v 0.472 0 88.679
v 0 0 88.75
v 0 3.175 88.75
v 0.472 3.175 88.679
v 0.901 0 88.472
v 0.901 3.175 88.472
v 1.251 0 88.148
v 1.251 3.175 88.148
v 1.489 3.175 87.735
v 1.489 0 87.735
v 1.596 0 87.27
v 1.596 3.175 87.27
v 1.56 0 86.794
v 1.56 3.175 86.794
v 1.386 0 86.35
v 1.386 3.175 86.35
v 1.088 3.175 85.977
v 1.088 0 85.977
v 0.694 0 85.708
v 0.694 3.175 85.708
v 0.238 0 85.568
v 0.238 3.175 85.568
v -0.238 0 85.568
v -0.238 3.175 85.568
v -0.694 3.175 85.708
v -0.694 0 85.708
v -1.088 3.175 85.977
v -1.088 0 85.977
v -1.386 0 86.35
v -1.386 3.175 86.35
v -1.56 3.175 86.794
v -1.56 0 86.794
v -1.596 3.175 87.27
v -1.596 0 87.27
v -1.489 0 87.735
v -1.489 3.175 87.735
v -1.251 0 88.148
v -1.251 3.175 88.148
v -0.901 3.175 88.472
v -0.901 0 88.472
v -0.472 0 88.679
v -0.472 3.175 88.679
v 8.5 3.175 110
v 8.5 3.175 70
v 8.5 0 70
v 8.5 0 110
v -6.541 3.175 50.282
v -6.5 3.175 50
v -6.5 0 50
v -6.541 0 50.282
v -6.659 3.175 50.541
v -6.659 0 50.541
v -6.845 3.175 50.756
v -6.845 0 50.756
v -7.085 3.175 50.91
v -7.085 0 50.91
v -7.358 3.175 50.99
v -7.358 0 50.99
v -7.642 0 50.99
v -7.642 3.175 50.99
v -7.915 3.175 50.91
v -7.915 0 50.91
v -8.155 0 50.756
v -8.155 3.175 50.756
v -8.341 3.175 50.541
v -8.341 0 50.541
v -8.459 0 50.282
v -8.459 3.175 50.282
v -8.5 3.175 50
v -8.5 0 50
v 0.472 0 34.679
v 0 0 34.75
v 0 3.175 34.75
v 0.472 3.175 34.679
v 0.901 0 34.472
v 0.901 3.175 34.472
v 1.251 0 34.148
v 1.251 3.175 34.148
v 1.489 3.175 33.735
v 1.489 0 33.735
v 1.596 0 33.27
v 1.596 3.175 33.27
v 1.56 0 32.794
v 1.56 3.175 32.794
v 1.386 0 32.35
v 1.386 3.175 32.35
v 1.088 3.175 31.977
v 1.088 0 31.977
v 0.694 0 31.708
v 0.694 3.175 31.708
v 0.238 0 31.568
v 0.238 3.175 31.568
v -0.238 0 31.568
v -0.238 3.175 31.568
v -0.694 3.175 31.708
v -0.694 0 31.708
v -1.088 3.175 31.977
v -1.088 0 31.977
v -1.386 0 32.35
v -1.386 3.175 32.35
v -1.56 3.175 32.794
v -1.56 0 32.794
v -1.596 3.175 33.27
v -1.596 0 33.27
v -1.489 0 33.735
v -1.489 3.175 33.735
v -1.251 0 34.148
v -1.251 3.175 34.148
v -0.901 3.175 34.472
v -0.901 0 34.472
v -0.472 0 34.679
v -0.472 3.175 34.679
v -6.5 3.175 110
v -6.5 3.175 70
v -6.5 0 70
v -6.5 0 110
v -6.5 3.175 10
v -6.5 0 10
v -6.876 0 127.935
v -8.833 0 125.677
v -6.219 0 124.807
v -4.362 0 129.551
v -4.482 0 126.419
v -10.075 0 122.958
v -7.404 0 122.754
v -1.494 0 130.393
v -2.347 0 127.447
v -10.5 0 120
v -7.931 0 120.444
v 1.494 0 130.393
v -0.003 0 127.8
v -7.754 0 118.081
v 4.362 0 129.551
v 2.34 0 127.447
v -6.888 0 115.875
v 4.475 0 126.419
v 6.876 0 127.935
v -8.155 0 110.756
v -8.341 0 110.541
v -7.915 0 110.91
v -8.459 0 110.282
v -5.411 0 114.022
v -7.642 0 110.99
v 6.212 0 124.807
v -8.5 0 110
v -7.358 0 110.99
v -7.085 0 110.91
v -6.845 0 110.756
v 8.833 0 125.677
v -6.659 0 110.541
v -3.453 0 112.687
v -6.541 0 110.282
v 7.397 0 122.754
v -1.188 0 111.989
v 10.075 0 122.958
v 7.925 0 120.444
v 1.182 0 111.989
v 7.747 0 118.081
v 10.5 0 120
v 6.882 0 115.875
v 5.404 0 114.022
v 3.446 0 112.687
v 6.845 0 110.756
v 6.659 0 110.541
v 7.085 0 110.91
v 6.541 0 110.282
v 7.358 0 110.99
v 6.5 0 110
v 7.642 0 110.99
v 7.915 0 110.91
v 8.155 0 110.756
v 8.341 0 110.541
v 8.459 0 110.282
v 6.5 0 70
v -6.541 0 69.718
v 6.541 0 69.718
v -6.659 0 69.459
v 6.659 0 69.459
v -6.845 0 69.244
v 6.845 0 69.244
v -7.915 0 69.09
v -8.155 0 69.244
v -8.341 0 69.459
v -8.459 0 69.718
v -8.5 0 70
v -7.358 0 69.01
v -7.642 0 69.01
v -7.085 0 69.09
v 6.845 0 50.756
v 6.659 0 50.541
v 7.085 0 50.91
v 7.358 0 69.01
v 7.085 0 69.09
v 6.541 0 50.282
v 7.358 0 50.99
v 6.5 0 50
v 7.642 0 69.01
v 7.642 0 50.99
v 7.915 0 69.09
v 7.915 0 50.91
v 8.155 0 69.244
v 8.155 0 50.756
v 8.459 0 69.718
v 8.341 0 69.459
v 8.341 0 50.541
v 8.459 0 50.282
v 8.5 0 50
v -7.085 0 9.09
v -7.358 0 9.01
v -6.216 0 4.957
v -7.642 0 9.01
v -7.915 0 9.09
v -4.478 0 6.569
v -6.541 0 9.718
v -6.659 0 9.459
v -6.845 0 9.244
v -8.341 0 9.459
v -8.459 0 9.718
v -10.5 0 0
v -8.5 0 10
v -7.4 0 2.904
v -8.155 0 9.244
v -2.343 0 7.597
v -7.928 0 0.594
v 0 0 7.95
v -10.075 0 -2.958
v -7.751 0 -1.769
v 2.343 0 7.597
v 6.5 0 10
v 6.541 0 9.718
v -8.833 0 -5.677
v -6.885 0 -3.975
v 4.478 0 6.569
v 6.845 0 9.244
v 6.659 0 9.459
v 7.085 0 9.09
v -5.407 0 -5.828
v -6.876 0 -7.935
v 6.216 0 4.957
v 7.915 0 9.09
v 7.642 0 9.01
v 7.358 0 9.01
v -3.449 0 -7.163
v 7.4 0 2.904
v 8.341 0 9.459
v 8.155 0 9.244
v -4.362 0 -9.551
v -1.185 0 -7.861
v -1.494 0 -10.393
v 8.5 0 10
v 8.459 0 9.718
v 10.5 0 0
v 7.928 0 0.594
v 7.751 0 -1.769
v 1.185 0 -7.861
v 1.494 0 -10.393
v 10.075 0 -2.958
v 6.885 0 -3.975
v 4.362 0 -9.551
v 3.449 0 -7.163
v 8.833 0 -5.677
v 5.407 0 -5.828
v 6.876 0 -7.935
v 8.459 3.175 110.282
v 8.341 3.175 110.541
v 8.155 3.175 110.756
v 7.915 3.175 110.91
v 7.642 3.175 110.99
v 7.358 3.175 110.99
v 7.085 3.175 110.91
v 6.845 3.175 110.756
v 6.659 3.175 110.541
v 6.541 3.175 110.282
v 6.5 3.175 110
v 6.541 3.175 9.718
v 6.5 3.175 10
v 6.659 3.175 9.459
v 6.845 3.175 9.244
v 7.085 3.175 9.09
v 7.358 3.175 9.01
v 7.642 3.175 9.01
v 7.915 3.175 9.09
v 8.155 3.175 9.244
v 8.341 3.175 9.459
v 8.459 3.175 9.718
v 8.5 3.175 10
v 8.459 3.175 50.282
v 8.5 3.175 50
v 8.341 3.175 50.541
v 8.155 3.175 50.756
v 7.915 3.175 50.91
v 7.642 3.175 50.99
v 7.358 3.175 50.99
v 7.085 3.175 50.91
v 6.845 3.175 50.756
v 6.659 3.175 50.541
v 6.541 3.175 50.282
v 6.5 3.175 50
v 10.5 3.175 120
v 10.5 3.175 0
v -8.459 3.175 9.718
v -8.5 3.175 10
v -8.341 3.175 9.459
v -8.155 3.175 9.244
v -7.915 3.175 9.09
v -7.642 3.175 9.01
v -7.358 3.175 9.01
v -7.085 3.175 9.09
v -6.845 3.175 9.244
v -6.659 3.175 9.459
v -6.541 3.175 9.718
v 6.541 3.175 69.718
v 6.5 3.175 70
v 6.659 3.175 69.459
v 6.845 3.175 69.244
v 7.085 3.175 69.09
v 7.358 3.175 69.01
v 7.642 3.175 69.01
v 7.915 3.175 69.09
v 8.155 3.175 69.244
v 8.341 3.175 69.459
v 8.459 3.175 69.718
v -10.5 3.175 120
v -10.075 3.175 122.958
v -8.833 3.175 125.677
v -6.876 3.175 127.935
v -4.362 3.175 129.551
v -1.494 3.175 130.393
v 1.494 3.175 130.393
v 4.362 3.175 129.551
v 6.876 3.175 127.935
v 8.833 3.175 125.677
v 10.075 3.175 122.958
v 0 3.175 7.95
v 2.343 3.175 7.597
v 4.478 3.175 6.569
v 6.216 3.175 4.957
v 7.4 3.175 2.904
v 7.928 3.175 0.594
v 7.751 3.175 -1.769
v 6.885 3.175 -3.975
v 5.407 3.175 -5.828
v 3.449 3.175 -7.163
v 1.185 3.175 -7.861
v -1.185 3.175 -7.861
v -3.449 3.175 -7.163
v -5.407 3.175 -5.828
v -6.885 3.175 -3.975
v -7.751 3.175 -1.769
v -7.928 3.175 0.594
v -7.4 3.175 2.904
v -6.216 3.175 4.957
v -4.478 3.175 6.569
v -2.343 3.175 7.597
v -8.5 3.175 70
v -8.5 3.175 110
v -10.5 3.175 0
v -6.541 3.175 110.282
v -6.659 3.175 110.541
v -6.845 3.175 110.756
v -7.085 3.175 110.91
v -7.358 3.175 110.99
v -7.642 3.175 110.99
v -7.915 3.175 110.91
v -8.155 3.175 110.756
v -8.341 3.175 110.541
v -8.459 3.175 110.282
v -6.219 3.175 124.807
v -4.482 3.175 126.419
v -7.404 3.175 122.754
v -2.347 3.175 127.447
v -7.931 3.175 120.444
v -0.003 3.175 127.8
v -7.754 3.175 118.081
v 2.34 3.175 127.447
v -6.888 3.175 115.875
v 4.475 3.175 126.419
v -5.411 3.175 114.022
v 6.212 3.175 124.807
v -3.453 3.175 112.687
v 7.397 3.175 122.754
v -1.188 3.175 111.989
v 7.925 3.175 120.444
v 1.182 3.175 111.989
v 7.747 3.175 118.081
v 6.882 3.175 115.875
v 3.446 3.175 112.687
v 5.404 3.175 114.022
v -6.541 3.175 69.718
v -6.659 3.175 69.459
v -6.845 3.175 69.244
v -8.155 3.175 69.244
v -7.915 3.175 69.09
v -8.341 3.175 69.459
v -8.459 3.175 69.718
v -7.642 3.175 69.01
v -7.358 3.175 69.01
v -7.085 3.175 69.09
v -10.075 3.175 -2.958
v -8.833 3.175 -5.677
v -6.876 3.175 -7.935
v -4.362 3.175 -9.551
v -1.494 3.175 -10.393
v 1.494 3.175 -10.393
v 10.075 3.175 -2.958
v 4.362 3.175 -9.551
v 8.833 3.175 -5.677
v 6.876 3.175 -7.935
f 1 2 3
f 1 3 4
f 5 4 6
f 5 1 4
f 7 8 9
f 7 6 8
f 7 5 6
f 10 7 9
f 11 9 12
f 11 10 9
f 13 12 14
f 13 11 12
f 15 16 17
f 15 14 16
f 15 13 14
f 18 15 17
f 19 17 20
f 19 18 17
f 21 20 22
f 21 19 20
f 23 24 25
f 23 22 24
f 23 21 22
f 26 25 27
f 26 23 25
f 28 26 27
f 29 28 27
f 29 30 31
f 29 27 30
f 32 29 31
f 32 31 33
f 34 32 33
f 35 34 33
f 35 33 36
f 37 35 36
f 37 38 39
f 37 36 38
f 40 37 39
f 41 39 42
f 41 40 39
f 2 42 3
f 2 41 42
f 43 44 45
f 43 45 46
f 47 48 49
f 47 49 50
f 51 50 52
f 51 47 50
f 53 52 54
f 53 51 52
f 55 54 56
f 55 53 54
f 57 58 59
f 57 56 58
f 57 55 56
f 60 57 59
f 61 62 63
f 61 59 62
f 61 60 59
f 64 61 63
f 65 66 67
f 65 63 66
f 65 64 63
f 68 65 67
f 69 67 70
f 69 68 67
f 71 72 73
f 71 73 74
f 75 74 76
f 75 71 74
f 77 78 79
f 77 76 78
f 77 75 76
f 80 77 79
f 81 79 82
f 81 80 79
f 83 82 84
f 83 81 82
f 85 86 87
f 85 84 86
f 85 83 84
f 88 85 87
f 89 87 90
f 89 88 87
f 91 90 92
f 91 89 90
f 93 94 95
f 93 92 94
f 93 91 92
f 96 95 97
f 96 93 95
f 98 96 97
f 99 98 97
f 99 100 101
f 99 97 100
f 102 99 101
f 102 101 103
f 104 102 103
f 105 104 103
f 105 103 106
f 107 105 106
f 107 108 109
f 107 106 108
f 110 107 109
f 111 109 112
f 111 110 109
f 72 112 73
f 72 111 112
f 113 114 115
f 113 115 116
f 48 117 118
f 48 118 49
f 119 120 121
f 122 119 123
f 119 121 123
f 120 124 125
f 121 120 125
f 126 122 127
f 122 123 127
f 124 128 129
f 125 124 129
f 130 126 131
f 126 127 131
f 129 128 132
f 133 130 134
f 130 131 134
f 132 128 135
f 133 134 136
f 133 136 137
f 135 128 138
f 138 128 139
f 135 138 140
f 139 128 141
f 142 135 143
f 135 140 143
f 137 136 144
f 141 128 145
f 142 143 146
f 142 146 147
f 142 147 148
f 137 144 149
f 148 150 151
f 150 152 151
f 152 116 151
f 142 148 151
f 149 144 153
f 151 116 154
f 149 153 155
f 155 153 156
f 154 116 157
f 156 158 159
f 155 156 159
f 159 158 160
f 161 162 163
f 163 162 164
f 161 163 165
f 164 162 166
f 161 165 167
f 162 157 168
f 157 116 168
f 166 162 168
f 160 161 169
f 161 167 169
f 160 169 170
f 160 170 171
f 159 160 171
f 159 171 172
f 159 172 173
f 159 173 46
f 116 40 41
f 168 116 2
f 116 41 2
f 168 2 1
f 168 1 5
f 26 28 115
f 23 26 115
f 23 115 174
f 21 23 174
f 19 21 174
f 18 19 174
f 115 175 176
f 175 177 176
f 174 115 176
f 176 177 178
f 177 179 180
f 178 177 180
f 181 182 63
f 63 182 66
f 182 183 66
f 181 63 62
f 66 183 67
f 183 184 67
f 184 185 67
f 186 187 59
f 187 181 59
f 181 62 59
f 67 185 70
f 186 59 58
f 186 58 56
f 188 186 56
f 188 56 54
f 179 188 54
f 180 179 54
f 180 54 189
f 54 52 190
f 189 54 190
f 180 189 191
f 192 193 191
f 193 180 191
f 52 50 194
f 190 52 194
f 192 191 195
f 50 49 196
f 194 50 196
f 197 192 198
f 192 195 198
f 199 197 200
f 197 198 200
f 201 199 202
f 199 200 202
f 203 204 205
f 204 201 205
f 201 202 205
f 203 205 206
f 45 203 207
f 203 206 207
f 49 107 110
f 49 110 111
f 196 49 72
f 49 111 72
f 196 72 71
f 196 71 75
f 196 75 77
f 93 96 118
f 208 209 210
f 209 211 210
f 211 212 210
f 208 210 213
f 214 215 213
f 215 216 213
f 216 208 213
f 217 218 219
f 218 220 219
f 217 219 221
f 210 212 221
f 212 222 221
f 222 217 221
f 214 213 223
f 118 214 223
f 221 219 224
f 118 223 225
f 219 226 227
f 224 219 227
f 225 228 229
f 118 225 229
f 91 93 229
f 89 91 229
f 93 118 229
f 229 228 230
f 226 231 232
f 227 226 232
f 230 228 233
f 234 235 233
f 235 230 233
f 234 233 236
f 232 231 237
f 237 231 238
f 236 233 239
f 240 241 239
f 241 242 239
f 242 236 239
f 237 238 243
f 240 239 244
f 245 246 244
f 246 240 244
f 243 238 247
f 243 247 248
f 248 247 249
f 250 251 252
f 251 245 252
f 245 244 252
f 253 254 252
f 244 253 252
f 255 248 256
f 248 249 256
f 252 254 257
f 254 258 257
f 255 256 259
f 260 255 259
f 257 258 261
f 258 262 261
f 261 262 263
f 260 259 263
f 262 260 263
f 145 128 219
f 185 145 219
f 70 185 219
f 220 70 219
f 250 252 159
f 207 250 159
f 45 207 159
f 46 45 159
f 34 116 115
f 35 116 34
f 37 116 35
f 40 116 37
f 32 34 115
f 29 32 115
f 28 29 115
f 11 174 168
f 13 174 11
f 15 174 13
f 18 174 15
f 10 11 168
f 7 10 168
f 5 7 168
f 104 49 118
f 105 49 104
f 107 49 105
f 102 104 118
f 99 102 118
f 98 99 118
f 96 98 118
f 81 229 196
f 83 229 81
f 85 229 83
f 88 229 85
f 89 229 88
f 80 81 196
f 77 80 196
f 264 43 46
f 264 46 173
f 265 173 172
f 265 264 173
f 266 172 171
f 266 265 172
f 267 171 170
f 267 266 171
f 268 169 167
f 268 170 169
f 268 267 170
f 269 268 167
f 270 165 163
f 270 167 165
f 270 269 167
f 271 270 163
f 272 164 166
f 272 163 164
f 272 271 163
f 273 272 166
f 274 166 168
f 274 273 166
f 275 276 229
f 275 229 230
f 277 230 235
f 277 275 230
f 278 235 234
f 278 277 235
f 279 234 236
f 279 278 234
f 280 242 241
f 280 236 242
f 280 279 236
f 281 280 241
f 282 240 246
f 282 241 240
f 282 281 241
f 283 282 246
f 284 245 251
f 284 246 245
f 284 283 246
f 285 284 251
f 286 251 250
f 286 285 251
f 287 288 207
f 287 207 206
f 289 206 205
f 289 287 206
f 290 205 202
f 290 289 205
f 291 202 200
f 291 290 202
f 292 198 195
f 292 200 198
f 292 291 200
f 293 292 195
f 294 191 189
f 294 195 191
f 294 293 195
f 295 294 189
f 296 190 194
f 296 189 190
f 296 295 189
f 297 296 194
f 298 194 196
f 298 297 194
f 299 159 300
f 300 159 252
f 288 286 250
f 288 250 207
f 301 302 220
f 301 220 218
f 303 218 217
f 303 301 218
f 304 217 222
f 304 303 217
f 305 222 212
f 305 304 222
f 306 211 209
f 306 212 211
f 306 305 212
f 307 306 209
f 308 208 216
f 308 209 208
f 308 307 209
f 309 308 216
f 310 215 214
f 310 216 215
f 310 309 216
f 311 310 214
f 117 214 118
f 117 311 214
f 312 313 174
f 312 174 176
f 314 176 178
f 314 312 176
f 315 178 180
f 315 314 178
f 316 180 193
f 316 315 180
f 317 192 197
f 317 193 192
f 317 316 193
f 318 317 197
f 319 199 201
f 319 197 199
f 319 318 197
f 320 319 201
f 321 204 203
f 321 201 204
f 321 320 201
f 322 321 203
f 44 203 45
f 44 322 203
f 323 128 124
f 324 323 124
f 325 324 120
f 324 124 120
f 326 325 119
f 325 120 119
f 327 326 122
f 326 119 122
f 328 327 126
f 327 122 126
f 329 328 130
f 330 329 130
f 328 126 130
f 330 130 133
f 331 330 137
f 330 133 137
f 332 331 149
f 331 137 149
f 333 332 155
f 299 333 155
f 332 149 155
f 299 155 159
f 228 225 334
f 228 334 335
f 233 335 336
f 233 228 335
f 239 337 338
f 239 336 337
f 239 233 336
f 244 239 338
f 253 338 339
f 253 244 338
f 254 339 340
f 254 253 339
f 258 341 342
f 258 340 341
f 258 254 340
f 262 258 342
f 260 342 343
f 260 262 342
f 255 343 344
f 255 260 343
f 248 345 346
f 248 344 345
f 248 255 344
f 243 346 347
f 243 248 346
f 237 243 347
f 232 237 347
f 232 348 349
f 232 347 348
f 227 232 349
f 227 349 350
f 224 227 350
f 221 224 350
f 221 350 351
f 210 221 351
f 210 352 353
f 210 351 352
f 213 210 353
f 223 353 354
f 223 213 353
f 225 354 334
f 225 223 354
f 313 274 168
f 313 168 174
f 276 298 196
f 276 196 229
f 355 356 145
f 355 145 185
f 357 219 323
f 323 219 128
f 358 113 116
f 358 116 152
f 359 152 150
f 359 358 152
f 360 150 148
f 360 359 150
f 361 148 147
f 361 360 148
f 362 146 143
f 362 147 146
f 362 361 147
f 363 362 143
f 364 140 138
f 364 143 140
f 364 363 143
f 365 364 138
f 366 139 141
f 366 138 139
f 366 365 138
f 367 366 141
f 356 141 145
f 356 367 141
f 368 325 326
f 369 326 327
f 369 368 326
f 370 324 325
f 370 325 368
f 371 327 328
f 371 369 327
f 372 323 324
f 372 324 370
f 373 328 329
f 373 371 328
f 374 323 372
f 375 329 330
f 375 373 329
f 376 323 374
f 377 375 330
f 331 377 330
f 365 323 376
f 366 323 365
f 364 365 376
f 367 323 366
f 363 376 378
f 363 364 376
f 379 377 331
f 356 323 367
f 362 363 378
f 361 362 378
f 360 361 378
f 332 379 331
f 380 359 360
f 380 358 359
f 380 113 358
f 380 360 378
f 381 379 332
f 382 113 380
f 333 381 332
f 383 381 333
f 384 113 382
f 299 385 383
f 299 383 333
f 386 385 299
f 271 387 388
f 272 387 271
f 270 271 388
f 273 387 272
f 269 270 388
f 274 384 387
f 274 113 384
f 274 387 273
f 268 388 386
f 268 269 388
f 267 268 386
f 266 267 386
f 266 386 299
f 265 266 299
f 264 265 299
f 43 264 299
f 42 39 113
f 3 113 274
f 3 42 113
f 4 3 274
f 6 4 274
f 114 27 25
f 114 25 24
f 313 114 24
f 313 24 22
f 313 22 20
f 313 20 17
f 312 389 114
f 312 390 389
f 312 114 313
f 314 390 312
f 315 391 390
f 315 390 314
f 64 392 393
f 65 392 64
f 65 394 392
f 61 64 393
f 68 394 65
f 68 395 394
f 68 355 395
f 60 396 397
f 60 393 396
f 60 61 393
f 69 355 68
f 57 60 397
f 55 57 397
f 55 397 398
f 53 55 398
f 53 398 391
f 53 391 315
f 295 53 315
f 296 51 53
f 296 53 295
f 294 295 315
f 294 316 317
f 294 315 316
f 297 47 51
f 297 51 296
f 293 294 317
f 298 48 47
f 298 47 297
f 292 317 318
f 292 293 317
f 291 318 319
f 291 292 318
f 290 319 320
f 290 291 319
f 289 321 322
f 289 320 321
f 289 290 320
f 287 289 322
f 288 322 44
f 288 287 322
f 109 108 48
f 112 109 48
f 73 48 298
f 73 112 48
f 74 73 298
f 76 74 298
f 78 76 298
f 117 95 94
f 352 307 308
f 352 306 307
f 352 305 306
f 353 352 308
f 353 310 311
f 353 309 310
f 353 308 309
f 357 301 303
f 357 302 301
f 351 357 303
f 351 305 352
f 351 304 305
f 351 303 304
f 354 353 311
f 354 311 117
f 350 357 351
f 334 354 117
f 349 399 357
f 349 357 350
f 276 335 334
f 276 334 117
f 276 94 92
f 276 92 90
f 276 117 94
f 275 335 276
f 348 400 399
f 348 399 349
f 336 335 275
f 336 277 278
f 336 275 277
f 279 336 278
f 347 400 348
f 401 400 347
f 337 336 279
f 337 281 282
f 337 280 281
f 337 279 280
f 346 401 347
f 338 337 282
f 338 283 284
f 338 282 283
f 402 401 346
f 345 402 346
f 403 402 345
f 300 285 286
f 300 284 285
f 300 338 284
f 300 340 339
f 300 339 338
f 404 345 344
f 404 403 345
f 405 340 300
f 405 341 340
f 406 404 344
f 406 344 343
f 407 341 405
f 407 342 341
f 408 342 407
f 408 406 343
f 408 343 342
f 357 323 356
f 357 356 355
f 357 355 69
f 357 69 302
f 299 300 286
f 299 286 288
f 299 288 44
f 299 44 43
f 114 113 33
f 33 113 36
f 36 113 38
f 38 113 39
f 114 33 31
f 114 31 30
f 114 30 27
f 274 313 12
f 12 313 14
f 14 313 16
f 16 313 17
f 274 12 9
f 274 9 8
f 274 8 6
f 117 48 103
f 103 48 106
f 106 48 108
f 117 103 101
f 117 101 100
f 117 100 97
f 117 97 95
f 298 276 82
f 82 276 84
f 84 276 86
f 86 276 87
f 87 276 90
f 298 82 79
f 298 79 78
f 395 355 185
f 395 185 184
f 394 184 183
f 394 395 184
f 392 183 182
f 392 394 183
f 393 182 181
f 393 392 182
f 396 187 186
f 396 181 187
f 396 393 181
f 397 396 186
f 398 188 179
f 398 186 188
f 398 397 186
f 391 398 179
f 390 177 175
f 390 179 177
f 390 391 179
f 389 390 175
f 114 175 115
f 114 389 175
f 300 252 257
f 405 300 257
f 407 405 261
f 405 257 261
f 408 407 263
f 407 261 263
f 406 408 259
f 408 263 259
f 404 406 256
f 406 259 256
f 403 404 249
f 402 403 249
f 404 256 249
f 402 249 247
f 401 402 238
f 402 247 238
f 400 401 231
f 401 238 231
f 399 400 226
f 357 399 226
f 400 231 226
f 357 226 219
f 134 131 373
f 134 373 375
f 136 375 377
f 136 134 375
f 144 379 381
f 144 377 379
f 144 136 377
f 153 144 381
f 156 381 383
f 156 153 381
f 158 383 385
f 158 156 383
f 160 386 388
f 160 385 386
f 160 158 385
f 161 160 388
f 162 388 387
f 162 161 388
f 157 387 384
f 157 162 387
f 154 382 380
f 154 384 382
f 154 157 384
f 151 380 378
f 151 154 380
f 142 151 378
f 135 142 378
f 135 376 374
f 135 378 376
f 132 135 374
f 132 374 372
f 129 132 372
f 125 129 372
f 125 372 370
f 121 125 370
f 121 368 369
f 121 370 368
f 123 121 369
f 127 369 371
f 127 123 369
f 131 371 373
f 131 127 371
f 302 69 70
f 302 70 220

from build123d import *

# Parameters (mm, degrees)
BOSS_EXTRUDE1_DEPTH     = 3.175
CUT_EXTRUDE2_DEPTH      = 131.960225355
CUT_EXTRUDE2_DEPTH_BACK = 131.960225355
CUT_EXTRUDE3_DEPTH      = 131.960225355
CUT_EXTRUDE3_DEPTH_BACK = 131.960225355
SKETCH4_R               = 1.6
CUT_EXTRUDE4_DEPTH      = 131.960225355
CUT_EXTRUDE4_DEPTH_BACK = 131.960225355
SKETCH5_R               = 7.95


with BuildPart() as part:
    # Sketch1 → Boss-Extrude1 (new body)
    with BuildSketch(Plane(origin=(0, 0, 0), x_dir=(1, 0, 0), z_dir=(0, 1, 0))):
        with BuildLine():
            Line((-10.5, 0), (-10.5, -120))
            ThreePointArc((-10.5, -120), (0, -130.5), (10.5, -120))
            Line((10.5, -120), (10.5, 0))
            ThreePointArc((10.5, 0), (0, 10.5), (-10.5, 0))
        make_face()
    extrude(amount=BOSS_EXTRUDE1_DEPTH)

    # Sketch3 → Cut-Extrude2 (cut, two sides: drawn at the far end of the back side and taken through both)
    with BuildSketch(Plane.XZ.offset(-CUT_EXTRUDE2_DEPTH_BACK)):
        with BuildLine():
            Line((-8.5, 110), (-8.5, 70))
            ThreePointArc((-8.5, 70), (-7.5, 69), (-6.5, 70))
            Line((-6.5, 70), (-6.5, 110))
            ThreePointArc((-6.5, 110), (-7.5, 111), (-8.5, 110))
        make_face()
        with BuildLine():
            Line((6.5, 110), (6.5, 70))
            ThreePointArc((6.5, 70), (7.5, 69), (8.5, 70))
            Line((8.5, 70), (8.5, 110))
            ThreePointArc((8.5, 110), (7.5, 111), (6.5, 110))
        make_face()
        with BuildLine():
            Line((8.5, 10), (8.5, 50))
            ThreePointArc((8.5, 50), (7.5, 51), (6.5, 50))
            Line((6.5, 50), (6.5, 10))
            ThreePointArc((6.5, 10), (7.5, 9), (8.5, 10))
        make_face()
        with BuildLine():
            Line((-8.5, 50), (-8.5, 10))
            ThreePointArc((-8.5, 10), (-7.5, 9), (-6.5, 10))
            Line((-6.5, 10), (-6.5, 50))
            ThreePointArc((-6.5, 50), (-7.5, 51), (-8.5, 50))
        make_face()
    extrude(amount=CUT_EXTRUDE2_DEPTH + CUT_EXTRUDE2_DEPTH_BACK, mode=Mode.SUBTRACT)

    # Sketch4 → Cut-Extrude3 (cut, two sides: drawn at the far end of the back side and taken through both)
    with BuildSketch(Plane(origin=(0, 3.175, 0), x_dir=(1, 0, 0), z_dir=(0, 1, 0)).offset(-CUT_EXTRUDE3_DEPTH_BACK)):
        with Locations(Location((0, -33.15, 0), (0, 0, 270))):
            Circle(SKETCH4_R)
        with Locations(Location((0, -87.15, 0), (0, 0, 270))):
            Circle(SKETCH4_R)
    extrude(amount=CUT_EXTRUDE3_DEPTH + CUT_EXTRUDE3_DEPTH_BACK, mode=Mode.SUBTRACT)

    # Sketch5 → Cut-Extrude4 (cut, two sides: drawn at the far end of the back side and taken through both)
    with BuildSketch(Plane(origin=(0, 3.175, 0), x_dir=(1, 0, 0), z_dir=(0, 1, 0)).offset(-CUT_EXTRUDE4_DEPTH_BACK)):
        with Locations(Location((0, 0, 0), (0, 0, 270))):
            Circle(SKETCH5_R)
        with Locations(Location((-0.003223035, -119.850034657, 0), (0, 0, 270))):
            Circle(SKETCH5_R)
    extrude(amount=CUT_EXTRUDE4_DEPTH + CUT_EXTRUDE4_DEPTH_BACK, mode=Mode.SUBTRACT)


solid = part.part
